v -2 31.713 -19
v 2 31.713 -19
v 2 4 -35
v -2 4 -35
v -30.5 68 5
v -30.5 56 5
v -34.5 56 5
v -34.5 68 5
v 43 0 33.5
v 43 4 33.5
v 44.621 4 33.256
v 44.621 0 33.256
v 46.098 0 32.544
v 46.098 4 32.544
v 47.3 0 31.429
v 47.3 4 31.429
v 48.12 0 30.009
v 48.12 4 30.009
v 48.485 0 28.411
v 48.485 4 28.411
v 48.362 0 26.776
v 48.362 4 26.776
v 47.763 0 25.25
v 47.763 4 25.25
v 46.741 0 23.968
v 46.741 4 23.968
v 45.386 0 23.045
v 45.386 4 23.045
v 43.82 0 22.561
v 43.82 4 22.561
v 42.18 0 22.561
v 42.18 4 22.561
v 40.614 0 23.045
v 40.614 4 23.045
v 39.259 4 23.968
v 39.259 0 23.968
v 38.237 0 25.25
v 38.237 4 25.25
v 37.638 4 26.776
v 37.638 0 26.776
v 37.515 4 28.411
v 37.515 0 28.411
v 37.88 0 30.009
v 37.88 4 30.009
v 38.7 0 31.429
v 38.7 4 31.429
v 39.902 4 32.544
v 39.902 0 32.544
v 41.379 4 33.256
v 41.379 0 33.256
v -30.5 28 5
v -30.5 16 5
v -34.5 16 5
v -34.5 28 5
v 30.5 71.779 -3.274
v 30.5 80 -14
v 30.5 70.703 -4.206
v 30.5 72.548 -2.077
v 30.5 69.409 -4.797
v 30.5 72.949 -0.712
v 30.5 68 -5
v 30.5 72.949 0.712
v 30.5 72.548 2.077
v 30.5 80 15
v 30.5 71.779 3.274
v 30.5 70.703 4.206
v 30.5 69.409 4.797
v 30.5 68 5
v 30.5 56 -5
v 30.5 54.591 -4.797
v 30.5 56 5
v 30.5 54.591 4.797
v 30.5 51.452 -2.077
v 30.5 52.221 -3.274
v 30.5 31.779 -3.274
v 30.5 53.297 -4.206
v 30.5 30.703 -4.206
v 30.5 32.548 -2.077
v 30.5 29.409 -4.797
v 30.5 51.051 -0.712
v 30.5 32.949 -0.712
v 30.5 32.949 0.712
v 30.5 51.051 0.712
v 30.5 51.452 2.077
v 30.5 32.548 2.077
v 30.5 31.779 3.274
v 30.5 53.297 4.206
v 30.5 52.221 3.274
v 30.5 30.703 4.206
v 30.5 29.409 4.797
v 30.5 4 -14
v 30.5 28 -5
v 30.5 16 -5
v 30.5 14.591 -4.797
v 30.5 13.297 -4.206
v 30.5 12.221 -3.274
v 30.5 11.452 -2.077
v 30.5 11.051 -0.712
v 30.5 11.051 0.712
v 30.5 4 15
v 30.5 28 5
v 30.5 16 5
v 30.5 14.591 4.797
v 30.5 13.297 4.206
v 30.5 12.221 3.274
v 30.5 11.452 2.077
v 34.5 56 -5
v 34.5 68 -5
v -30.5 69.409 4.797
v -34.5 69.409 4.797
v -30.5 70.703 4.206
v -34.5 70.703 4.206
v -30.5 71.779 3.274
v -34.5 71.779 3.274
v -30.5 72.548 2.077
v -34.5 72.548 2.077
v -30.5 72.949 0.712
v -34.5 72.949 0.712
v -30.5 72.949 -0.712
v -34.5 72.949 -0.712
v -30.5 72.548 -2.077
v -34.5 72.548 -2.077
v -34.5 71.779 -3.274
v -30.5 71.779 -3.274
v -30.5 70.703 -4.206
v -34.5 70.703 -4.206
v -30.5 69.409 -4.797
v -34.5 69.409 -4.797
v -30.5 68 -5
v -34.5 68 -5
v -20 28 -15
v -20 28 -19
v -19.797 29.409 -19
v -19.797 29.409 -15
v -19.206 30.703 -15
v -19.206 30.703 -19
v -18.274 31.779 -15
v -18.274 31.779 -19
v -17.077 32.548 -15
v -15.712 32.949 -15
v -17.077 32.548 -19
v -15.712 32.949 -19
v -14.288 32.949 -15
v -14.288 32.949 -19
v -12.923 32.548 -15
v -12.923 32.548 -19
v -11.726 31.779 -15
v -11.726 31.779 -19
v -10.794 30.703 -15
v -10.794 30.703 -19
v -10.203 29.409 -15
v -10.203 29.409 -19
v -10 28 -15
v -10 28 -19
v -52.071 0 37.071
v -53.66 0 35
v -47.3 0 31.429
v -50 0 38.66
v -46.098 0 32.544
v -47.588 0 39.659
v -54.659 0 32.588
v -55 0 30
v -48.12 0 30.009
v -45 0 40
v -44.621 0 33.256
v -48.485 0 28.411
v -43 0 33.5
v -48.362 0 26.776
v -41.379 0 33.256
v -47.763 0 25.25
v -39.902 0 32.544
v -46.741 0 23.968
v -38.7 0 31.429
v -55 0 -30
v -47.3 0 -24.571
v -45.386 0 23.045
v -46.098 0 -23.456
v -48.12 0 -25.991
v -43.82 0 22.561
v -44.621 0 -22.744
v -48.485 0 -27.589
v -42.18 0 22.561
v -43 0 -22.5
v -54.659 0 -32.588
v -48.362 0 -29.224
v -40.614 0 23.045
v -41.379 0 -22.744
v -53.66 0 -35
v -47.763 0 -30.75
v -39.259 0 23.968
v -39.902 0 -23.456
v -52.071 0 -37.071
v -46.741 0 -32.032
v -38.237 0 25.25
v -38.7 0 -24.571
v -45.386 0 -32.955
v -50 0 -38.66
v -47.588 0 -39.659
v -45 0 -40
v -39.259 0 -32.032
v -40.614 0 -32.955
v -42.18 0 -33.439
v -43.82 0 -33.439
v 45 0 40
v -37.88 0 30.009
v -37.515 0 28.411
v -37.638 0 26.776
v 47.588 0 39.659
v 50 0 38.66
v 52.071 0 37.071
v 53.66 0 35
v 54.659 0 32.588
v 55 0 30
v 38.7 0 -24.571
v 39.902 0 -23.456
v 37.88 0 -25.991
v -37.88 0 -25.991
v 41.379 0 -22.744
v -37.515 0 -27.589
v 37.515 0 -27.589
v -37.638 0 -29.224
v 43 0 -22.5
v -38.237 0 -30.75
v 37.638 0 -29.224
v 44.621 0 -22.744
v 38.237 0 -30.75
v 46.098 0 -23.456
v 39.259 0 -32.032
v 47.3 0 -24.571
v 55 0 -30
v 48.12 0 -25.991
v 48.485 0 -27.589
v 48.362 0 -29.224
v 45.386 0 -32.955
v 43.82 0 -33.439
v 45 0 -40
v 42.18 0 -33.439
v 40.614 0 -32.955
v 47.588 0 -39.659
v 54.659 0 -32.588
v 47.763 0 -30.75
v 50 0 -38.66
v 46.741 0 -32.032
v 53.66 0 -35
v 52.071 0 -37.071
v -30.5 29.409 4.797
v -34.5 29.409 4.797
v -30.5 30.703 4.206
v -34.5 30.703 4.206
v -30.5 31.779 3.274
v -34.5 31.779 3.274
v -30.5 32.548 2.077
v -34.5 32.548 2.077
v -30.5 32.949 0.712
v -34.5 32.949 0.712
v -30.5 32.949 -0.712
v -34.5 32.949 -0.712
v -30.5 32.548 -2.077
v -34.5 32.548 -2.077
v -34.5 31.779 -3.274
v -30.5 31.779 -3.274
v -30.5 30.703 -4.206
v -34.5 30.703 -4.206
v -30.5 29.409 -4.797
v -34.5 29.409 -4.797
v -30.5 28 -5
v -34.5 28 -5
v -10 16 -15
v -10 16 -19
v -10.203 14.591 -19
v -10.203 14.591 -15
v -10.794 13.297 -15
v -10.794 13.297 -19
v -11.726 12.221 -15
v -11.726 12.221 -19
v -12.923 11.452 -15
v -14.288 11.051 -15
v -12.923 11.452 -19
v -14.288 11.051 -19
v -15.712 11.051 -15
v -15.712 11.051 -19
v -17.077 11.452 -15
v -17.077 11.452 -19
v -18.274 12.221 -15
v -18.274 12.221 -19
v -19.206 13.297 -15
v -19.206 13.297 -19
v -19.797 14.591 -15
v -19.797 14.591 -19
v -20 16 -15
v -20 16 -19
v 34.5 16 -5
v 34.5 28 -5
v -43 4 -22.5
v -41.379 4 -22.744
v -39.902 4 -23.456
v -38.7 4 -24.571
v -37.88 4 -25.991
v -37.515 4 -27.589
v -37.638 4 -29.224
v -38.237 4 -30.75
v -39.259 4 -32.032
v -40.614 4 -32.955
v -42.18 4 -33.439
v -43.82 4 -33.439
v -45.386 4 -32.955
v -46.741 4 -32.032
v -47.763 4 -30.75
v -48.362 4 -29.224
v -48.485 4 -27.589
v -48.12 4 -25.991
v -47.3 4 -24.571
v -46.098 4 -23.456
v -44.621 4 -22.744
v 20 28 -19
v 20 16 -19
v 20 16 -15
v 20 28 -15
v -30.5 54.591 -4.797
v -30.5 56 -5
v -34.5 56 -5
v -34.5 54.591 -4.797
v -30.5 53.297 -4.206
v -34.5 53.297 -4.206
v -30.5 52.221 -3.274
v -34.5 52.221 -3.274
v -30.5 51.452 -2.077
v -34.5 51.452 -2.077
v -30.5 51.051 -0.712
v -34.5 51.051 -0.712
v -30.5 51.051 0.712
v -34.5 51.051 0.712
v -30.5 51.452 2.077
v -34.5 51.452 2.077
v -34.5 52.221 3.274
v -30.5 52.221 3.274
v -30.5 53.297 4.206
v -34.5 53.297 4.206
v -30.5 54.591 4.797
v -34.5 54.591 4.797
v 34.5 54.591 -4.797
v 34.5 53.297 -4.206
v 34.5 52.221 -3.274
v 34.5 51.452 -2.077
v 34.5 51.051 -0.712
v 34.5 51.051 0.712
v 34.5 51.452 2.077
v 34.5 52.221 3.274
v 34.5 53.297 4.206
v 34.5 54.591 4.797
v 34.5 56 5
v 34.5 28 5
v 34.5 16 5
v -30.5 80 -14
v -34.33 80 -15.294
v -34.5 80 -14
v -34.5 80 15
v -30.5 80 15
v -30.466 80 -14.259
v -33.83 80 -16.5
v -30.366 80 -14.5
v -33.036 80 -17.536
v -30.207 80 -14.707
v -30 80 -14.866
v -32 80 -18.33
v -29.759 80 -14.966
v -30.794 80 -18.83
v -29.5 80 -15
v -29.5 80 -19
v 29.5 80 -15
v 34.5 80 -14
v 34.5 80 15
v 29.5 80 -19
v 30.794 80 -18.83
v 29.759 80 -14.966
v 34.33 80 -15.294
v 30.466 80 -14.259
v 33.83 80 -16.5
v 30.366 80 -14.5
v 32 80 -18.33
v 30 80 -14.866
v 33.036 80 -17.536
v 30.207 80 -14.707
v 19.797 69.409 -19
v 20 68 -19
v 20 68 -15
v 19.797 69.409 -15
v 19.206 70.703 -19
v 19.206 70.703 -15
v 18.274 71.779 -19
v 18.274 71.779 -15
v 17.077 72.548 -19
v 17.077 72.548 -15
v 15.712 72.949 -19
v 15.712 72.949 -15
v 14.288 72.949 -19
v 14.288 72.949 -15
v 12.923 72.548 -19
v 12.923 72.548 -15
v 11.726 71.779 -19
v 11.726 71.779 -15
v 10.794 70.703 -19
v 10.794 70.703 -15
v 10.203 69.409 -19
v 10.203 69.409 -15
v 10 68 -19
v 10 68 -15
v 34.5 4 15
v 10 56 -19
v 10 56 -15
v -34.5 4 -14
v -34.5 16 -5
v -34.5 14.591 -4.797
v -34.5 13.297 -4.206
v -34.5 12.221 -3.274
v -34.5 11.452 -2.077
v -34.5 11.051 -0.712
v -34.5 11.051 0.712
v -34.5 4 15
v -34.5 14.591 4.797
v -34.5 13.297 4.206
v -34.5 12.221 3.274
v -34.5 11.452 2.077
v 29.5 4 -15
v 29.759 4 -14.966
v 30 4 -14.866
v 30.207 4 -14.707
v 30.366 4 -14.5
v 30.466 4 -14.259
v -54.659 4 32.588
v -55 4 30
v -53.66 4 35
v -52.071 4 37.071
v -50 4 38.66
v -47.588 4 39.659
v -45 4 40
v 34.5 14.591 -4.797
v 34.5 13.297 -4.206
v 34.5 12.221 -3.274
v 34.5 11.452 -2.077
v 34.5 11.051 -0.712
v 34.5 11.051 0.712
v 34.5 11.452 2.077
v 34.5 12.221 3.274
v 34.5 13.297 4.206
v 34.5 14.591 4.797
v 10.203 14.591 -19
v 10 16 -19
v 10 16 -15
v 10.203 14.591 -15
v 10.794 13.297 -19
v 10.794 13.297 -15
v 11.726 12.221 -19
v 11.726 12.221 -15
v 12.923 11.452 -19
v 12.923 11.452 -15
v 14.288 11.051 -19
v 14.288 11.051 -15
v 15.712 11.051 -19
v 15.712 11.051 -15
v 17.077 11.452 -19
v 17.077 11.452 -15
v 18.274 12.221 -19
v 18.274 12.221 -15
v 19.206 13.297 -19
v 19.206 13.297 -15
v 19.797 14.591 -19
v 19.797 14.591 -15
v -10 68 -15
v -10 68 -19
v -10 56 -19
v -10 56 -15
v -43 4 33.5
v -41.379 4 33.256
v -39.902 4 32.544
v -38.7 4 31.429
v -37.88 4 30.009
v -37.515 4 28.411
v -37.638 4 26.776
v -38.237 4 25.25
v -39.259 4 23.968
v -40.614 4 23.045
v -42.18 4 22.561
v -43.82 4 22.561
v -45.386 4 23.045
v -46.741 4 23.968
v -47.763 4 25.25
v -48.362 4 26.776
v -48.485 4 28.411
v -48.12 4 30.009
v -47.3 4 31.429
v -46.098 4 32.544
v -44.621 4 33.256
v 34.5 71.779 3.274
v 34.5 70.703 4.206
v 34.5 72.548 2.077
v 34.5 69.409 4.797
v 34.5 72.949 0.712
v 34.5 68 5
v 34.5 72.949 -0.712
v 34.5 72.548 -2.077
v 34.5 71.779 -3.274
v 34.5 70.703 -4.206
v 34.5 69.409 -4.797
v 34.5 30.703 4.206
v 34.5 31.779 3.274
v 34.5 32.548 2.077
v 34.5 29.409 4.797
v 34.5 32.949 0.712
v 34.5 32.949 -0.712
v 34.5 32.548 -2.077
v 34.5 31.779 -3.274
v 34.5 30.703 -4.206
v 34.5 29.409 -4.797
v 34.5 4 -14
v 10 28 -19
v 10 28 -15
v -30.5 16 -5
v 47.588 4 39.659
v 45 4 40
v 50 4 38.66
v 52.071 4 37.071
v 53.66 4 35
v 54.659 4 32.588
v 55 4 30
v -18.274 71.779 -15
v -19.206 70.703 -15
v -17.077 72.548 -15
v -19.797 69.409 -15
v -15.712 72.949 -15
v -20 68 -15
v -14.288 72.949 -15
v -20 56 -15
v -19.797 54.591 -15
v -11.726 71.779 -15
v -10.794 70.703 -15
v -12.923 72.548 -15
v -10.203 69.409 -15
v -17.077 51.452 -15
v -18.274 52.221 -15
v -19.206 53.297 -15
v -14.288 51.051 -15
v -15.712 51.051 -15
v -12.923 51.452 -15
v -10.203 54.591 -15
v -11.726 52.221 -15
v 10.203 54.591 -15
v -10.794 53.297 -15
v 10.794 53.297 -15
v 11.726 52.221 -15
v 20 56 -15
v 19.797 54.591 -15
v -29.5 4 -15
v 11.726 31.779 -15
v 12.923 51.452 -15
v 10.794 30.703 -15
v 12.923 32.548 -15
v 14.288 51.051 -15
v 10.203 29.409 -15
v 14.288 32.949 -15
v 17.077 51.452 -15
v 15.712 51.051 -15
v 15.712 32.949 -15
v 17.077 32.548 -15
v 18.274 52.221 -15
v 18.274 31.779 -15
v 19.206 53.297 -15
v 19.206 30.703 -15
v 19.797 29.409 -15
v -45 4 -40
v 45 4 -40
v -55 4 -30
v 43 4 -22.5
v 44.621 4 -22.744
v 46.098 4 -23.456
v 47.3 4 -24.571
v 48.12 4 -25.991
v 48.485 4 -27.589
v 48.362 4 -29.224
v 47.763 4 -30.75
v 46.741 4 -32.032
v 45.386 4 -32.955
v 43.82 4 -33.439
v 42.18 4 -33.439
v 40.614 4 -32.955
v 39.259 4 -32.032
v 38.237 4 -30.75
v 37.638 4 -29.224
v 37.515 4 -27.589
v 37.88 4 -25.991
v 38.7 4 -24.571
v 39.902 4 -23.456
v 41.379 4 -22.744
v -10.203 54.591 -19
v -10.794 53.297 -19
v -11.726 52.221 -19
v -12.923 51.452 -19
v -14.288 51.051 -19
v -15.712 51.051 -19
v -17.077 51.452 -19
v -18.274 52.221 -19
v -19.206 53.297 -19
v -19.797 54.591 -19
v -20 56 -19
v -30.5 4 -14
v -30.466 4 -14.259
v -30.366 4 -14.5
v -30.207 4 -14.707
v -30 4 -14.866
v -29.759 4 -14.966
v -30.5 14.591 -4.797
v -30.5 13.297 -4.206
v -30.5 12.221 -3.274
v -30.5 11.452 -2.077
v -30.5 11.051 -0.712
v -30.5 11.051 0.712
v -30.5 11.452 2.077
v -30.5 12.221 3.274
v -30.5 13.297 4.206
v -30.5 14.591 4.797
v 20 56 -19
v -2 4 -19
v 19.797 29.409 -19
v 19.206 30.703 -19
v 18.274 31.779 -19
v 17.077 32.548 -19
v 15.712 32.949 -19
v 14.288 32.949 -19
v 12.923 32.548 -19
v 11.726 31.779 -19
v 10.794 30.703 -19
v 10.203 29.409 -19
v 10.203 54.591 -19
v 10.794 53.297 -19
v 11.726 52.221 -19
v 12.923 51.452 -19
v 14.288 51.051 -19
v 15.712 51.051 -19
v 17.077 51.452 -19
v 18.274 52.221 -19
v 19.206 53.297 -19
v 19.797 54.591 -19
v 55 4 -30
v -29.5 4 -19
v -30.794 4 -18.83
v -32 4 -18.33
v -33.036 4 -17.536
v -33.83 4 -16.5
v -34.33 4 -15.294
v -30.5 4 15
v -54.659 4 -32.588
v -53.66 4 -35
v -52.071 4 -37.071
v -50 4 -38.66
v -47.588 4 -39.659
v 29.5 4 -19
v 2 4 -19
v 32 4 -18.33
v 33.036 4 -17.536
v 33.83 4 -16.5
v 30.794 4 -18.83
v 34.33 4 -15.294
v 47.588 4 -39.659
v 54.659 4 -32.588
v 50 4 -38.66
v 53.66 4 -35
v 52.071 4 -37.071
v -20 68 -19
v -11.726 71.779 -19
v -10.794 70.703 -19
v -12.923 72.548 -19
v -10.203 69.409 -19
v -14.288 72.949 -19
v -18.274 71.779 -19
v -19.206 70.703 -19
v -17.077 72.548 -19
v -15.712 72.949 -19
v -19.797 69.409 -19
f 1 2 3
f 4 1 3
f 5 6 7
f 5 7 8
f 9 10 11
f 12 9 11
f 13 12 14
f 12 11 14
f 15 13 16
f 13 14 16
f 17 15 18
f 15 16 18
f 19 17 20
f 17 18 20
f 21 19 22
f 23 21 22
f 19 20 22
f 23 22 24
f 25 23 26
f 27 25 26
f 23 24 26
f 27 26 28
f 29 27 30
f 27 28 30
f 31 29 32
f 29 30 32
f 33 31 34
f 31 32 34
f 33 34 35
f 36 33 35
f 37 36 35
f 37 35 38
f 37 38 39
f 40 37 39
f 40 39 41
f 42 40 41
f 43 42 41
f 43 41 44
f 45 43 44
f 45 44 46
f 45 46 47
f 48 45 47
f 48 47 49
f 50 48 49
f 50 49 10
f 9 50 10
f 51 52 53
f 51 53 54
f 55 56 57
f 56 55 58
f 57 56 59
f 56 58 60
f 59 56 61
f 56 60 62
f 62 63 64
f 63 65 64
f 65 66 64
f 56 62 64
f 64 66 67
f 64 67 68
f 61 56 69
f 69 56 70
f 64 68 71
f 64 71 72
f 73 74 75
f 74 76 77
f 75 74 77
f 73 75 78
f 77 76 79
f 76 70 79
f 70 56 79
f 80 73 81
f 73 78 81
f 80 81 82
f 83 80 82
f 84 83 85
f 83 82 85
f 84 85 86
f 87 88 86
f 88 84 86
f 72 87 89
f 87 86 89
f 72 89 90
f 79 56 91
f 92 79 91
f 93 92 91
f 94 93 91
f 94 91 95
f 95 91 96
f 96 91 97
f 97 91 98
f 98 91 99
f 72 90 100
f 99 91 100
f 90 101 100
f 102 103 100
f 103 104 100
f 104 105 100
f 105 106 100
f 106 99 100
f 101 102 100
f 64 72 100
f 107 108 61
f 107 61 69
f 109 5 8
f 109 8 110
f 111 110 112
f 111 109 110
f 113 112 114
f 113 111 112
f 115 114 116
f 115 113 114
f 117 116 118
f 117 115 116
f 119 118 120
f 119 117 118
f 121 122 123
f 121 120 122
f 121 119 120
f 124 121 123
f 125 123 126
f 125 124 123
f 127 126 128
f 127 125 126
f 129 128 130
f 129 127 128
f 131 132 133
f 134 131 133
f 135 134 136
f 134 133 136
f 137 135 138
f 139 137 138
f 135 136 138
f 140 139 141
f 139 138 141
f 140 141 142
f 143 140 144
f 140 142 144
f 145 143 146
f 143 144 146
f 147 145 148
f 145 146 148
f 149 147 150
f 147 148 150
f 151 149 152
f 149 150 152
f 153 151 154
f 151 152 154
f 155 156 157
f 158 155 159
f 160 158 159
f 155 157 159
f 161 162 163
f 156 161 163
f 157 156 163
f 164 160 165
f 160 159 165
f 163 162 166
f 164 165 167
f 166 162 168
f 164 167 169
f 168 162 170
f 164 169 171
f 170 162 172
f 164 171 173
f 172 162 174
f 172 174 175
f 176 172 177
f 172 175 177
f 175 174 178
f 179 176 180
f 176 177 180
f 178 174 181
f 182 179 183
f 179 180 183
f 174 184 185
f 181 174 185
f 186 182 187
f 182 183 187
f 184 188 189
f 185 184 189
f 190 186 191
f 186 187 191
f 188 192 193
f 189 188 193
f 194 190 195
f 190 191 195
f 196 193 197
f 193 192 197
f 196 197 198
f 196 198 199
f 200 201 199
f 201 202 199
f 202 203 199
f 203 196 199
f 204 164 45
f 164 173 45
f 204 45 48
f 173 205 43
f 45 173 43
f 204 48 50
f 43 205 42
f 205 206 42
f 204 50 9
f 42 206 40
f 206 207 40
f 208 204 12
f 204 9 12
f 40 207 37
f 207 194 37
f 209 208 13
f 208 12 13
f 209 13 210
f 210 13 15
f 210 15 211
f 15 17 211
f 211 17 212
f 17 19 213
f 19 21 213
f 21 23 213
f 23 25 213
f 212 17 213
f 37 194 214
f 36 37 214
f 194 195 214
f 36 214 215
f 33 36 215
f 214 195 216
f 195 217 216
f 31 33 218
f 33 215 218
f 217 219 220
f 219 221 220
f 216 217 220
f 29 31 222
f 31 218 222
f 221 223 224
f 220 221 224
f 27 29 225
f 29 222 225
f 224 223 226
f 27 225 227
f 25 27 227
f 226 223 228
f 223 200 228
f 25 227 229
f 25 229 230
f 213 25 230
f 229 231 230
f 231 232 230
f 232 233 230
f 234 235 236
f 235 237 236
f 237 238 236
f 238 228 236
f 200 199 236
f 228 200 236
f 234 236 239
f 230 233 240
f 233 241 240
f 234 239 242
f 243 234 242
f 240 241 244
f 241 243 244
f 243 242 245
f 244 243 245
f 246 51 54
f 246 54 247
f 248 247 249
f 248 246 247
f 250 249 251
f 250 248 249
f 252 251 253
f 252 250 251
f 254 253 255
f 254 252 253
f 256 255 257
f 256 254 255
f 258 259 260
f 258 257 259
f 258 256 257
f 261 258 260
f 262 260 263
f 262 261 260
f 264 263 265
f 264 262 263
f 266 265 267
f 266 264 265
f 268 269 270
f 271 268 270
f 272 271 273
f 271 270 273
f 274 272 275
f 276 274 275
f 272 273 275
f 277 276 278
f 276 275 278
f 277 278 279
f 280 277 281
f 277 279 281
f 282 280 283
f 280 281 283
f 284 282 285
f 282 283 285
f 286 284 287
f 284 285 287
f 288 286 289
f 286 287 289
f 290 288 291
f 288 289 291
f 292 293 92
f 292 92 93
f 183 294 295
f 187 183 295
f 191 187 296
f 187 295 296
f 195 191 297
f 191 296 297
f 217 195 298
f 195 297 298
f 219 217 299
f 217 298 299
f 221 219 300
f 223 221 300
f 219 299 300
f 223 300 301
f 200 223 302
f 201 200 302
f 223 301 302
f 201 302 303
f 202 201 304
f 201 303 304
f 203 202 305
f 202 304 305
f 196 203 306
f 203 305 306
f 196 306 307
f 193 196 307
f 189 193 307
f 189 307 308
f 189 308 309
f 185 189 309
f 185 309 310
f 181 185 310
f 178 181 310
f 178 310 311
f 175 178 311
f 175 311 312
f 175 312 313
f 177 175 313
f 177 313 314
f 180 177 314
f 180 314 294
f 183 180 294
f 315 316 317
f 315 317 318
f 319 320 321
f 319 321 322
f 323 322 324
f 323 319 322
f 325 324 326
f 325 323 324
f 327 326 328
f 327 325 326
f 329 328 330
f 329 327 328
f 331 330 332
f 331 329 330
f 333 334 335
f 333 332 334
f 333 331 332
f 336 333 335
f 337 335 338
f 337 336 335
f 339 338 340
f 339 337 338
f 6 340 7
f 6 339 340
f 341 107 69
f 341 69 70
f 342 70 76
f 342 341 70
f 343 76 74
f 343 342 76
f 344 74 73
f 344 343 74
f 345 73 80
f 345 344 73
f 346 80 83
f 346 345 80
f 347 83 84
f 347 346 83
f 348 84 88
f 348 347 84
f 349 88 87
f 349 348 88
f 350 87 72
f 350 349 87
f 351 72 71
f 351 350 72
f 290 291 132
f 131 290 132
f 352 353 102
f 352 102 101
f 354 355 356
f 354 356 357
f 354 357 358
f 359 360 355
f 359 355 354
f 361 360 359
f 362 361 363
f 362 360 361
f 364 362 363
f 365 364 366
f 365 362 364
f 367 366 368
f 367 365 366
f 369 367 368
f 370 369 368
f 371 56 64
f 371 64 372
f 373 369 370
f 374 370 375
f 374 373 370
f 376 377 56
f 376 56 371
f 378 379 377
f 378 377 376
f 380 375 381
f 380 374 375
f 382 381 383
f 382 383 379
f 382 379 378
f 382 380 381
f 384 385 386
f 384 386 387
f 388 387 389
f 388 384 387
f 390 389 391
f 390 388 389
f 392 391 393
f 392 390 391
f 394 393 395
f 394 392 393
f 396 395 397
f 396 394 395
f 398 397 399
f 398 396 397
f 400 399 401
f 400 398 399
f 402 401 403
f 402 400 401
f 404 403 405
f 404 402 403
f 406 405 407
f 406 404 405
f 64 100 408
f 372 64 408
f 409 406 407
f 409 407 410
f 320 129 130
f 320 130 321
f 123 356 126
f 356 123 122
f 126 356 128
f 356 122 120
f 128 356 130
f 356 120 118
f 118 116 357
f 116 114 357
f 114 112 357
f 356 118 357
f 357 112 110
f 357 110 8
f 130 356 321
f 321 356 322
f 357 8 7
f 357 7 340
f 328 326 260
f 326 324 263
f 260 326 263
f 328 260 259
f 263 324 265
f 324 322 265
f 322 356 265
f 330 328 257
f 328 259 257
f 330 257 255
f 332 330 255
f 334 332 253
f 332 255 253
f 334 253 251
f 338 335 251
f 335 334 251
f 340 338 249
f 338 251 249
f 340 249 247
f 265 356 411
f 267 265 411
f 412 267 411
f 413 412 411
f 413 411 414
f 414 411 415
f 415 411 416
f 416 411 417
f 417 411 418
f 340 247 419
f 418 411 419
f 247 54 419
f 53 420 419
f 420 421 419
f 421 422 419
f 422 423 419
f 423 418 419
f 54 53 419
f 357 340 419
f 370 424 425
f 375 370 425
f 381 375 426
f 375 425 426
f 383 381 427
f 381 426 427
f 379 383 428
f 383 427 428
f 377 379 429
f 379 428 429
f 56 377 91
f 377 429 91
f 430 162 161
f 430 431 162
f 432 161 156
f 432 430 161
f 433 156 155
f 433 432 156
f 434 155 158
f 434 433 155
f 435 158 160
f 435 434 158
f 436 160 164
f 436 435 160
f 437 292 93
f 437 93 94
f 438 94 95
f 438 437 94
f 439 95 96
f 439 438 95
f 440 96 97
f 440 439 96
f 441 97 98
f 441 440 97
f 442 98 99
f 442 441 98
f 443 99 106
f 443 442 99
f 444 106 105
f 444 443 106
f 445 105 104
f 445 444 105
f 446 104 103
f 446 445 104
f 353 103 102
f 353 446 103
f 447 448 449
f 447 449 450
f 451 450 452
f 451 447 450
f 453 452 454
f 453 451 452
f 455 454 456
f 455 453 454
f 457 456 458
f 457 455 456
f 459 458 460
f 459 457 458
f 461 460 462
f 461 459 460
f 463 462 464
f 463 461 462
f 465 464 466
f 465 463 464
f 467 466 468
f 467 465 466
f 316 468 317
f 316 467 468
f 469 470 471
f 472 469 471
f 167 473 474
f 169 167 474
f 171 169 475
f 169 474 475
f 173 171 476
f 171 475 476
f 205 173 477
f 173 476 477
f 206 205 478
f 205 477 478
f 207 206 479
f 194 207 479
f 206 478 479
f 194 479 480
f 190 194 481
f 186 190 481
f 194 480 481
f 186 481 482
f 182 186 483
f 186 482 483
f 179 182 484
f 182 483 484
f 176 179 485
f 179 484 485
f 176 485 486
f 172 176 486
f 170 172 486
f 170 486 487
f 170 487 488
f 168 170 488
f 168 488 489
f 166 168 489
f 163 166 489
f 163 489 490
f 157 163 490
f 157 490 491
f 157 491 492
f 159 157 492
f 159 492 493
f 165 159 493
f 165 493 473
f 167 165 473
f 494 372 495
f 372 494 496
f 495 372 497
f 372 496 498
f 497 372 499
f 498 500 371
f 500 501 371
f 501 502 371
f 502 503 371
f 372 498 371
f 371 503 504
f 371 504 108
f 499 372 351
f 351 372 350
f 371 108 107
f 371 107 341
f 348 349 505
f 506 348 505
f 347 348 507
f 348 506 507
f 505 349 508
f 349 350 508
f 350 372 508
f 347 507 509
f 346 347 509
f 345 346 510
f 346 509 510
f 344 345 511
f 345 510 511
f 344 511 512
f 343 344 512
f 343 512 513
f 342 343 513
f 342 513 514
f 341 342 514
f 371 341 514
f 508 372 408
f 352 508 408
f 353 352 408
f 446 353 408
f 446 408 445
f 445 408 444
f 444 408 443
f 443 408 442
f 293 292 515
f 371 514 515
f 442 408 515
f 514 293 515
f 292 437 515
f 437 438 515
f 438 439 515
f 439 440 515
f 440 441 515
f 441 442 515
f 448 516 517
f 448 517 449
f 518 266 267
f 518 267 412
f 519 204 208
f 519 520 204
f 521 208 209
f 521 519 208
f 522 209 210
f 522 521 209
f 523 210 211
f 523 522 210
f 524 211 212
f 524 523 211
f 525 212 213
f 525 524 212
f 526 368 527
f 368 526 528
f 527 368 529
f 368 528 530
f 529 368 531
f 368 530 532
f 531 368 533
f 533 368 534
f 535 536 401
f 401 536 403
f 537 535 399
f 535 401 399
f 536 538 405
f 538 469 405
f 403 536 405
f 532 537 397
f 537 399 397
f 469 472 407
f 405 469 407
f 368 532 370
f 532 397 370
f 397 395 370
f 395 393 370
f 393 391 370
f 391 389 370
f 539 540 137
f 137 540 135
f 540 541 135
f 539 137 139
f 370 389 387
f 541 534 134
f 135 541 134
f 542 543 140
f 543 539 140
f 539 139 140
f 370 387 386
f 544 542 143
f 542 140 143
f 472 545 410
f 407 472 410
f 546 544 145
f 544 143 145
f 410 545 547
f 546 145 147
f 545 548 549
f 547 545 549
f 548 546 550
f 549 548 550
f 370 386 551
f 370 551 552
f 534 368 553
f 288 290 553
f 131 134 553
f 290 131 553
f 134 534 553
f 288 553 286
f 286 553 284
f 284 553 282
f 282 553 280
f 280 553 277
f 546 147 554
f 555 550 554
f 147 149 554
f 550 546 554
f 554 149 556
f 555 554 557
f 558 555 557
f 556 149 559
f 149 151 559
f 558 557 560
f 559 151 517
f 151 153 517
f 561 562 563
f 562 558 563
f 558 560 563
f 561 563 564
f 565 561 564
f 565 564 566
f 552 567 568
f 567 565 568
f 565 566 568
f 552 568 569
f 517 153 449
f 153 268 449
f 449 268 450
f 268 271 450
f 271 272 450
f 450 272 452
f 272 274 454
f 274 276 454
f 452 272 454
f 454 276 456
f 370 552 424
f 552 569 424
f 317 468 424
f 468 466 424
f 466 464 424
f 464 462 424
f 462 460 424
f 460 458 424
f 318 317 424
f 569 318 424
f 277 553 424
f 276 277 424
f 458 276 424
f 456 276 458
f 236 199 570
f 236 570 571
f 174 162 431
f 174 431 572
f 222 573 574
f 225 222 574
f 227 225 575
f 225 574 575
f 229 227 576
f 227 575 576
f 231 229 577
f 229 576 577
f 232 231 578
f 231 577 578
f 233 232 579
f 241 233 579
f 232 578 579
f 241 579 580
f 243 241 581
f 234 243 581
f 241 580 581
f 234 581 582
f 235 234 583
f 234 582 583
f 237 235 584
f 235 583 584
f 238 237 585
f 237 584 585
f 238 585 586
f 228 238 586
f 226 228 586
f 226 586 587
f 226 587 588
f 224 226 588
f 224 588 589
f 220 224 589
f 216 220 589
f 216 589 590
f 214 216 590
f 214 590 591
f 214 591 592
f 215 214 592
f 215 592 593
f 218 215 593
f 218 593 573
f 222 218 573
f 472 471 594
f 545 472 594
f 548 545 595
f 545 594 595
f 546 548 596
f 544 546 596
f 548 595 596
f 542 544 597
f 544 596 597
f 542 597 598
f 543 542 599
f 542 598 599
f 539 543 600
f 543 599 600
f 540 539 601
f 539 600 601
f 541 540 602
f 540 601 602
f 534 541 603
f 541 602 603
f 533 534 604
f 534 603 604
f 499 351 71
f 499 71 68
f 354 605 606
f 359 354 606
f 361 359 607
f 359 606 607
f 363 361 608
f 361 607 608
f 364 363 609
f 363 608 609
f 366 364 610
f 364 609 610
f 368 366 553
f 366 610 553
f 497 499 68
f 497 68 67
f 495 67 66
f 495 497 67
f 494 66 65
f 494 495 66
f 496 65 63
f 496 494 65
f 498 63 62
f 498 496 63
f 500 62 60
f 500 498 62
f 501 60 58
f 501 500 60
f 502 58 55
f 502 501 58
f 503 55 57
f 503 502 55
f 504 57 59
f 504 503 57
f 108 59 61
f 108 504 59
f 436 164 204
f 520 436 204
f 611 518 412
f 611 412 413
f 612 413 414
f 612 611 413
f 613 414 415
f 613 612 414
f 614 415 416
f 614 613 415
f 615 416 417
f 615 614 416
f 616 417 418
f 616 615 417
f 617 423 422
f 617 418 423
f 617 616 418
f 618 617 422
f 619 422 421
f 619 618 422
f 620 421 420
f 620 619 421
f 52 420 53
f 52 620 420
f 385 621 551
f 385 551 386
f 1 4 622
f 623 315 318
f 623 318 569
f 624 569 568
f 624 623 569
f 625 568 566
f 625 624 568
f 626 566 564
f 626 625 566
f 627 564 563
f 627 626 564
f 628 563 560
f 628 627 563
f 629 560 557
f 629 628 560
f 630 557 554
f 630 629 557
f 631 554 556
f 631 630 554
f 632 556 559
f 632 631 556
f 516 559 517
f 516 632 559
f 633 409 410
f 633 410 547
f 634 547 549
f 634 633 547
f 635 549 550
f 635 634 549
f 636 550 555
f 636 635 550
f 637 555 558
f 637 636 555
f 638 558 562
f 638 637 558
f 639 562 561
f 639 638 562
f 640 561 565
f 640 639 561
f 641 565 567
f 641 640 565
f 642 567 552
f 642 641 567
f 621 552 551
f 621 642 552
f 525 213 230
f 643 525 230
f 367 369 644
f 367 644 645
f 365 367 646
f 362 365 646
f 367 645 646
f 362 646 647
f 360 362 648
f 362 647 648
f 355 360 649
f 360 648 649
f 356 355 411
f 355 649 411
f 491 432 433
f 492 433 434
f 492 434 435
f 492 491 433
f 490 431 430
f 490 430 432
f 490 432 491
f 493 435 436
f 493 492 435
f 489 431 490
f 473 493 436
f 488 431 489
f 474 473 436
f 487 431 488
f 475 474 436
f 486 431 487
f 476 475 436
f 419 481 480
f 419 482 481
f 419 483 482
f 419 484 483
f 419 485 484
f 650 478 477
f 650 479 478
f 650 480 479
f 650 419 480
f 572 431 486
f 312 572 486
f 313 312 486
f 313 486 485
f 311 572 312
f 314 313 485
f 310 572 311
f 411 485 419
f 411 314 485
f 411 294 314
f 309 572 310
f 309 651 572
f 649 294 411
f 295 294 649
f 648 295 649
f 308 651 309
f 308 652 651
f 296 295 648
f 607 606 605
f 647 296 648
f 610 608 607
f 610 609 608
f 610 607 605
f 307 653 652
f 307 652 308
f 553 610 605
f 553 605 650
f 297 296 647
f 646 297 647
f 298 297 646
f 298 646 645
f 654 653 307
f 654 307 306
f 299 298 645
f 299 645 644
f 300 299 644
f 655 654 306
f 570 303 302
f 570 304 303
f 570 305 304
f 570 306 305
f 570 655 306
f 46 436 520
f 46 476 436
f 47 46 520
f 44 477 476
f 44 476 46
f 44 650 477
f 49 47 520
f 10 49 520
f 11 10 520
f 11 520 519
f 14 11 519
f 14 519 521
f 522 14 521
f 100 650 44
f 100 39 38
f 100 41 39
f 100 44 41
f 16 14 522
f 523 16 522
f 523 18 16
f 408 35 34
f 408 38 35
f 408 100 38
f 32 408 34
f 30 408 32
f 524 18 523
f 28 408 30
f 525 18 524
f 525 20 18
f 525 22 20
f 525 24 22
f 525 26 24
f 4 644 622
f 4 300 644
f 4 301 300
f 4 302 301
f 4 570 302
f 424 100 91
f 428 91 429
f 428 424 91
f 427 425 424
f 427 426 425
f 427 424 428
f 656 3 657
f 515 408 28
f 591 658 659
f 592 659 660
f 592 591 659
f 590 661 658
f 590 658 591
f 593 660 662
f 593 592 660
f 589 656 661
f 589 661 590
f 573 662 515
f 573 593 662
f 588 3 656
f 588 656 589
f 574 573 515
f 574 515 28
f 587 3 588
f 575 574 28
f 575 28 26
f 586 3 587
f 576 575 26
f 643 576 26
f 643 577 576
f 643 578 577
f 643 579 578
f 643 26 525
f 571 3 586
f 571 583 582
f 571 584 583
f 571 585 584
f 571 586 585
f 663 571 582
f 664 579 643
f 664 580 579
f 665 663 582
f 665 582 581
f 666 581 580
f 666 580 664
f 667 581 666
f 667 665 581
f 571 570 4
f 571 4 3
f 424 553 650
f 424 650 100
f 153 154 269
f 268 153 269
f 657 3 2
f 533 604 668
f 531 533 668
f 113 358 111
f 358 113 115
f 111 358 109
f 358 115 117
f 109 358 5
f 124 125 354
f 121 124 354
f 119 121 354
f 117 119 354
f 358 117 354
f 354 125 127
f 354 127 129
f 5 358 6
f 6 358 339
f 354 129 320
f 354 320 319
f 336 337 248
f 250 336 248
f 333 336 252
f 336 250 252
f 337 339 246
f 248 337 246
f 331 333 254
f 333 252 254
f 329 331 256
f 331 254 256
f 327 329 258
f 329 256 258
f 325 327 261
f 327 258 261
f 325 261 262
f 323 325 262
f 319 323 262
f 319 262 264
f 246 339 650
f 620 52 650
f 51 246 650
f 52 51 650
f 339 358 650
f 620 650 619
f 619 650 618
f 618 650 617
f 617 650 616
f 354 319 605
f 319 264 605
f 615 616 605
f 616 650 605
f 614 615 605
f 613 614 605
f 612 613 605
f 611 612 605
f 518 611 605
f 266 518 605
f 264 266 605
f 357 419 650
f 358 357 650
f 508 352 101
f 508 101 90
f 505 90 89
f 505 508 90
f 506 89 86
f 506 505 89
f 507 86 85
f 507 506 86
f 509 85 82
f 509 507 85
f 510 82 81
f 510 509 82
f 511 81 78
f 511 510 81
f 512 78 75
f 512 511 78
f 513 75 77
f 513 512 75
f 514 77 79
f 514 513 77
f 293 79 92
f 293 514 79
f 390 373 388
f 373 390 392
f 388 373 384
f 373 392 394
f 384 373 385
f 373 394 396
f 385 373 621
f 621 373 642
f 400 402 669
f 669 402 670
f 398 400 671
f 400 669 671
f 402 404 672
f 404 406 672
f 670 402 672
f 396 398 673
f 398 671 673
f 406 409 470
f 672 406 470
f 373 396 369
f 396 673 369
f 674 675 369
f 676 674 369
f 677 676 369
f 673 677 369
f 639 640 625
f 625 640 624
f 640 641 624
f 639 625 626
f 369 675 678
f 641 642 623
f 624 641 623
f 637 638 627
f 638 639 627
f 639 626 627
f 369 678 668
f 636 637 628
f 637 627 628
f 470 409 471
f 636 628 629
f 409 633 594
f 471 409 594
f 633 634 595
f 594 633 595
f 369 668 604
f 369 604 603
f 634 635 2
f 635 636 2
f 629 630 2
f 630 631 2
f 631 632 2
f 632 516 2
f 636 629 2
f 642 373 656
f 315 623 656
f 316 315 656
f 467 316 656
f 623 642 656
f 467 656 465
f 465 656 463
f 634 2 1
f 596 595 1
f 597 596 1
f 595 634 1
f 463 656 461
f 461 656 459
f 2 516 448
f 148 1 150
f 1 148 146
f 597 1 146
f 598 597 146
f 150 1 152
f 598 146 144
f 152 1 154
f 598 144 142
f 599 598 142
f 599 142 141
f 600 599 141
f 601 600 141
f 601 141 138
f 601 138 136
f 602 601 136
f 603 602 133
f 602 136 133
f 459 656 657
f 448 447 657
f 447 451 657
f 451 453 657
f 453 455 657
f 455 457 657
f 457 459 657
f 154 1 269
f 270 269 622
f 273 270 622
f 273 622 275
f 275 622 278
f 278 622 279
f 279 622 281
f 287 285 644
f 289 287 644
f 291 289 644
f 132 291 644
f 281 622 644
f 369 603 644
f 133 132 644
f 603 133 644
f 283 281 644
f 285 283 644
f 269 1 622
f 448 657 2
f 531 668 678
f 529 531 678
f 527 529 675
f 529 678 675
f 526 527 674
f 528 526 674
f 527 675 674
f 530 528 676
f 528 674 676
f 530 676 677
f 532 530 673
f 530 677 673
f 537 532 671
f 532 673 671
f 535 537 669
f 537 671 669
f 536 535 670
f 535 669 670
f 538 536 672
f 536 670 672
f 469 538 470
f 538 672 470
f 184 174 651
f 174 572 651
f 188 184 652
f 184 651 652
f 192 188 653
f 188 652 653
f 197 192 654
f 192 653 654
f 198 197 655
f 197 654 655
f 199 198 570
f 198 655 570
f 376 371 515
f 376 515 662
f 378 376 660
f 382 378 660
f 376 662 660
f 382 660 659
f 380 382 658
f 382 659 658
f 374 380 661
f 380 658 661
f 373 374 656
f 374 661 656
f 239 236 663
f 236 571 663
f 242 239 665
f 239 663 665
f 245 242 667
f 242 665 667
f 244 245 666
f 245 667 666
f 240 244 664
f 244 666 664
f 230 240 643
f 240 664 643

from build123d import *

# Parameters (mm, degrees)
SKETCH_2_W          = 110
SKETCH_2_H          = 80
EXTRUDE_1_DEPTH     = 4
EXTRUDE_1_2_DEPTH   = 76
EXTRUDE_2_DEPTH     = 2
CUT_EXTRUDE_1_DEPTH = 90.5
SKETCH_6_R          = 5.5
CUT_EXTRUDE_2_DEPTH = 5
FILLET_1_R          = 10
CUT_EXTRUDE_3_REACH = 61


with BuildPart() as part:
    # Эскиз2 → Extrude 1 (new body)
    with BuildSketch(Plane(origin=(0, 0, 0), x_dir=(1, 0, 0), z_dir=(0, 1, 0))):
        Rectangle(SKETCH_2_W, SKETCH_2_H)
    extrude(amount=EXTRUDE_1_DEPTH)

    # Эскиз3 → Extrude 1 2 (add)
    with BuildSketch(Plane(origin=(0, 4, 0), x_dir=(1, 0, 0), z_dir=(0, 1, 0))):
        with BuildLine():
            Line((-30.5, -15), (-30.5, 14))
            ThreePointArc((-30.5, 14), (-30.207106781, 14.707106781), (-29.5, 15))
            Line((-29.5, 15), (29.5, 15))
            ThreePointArc((29.5, 15), (30.207106781, 14.707106781), (30.5, 14))
            Line((30.5, 14), (30.5, -15))
            Line((30.5, -15), (34.5, -15))
            Line((34.5, -15), (34.5, 14))
            ThreePointArc((34.5, 14), (33.035533906, 17.535533906), (29.5, 19))
            Line((29.5, 19), (-29.5, 19))
            ThreePointArc((-29.5, 19), (-33.035533906, 17.535533906), (-34.5, 14))
            Line((-34.5, 14), (-34.5, -15))
            Line((-34.5, -15), (-30.5, -15))
        make_face()
    extrude(amount=EXTRUDE_1_2_DEPTH)

    # Эскиз4 → Бобышка-Вытянуть2 (add, symmetric)
    with BuildSketch(Plane(origin=(0, 0, 0), x_dir=(0, 0, -1), z_dir=(1, 0, 0))):
        Polygon((19, 31.712812921), (35, 4), (19, 4), align=None)
    extrude(amount=EXTRUDE_2_DEPTH, both=True)

    # Эскиз5 → Вырез-Вытянуть1 (cut, through all)
    with BuildSketch(Plane(origin=(34.5, 0, 0), x_dir=(0, 0, -1), z_dir=(1, 0, 0))):
        with BuildLine():
            Line((5, 68), (5, 56))
            ThreePointArc((5, 56), (0, 51), (-5, 56))
            Line((-5, 56), (-5, 68))
            ThreePointArc((-5, 68), (0, 73), (5, 68))
        make_face()
        with BuildLine():
            Line((5, 28), (5, 16))
            ThreePointArc((5, 16), (0, 11), (-5, 16))
            Line((-5, 16), (-5, 28))
            ThreePointArc((-5, 28), (0, 33), (5, 28))
        make_face()
    extrude(amount=-CUT_EXTRUDE_1_DEPTH, mode=Mode.SUBTRACT)

    # Эскиз6 → Вырез-Вытянуть2 (cut, through all)
    with BuildSketch(Plane(origin=(0, 4, 0), x_dir=(1, 0, 0), z_dir=(0, 1, 0))):
        with Locations(Location((-43, 28, 0), (0, 0, 270))):  # turned: the seam where the file's is
            Circle(SKETCH_6_R)
        with Locations(Location((-43, -28, 0), (0, 0, 270))):  # turned: the seam where the file's is
            Circle(SKETCH_6_R)
        with Locations(Location((43, 28, 0), (0, 0, 270))):  # turned: the seam where the file's is
            Circle(SKETCH_6_R)
        with Locations(Location((43, -28, 0), (0, 0, 270))):  # turned: the seam where the file's is
            Circle(SKETCH_6_R)
    extrude(amount=-CUT_EXTRUDE_2_DEPTH, mode=Mode.SUBTRACT)

    # Скругление1
    fillet_1_edges = [part.edges().sort_by_distance(p)[0] for p in [
        (55, 2, 40),
        (-55, 2, 40),
        (-55, 2, -40),
        (55, 2, -40),
    ]]
    fillet(fillet_1_edges, radius=FILLET_1_R)

    # Эскиз8 → Вырез-Вытянуть3 (cut, up to next)
    with BuildSketch(Plane(origin=(0, 0, -19), x_dir=(-1, 0, 0), z_dir=(0, 0, -1)), mode=Mode.PRIVATE) as cut_extrude_3_sk1:
        with BuildLine():
            Line((-10, 68), (-10, 56))
            ThreePointArc((-10, 56), (-15, 51), (-20, 56))
            Line((-20, 56), (-20, 68))
            ThreePointArc((-20, 68), (-15, 73), (-10, 68))
        make_face()
    cut_extrude_3_tool1 = extrude(cut_extrude_3_sk1.sketch, amount=-CUT_EXTRUDE_3_REACH, mode=Mode.PRIVATE) & part.part
    add(cut_extrude_3_tool1.solids().sort_by_distance((15, 62, -19))[0], mode=Mode.SUBTRACT)
    # Эскиз8 → Вырез-Вытянуть3 (cut, up to next)
    with BuildSketch(Plane(origin=(0, 0, -19), x_dir=(-1, 0, 0), z_dir=(0, 0, -1)), mode=Mode.PRIVATE) as cut_extrude_3_sk2:
        with BuildLine():
            Line((-10, 28), (-10, 16))
            ThreePointArc((-10, 16), (-15, 11), (-20, 16))
            Line((-20, 16), (-20, 28))
            ThreePointArc((-20, 28), (-15, 33), (-10, 28))
        make_face()
    cut_extrude_3_tool2 = extrude(cut_extrude_3_sk2.sketch, amount=-CUT_EXTRUDE_3_REACH, mode=Mode.PRIVATE) & part.part
    add(cut_extrude_3_tool2.solids().sort_by_distance((15, 22, -19))[0], mode=Mode.SUBTRACT)
    # Эскиз8 → Вырез-Вытянуть3 (cut, up to next)
    with BuildSketch(Plane(origin=(0, 0, -19), x_dir=(-1, 0, 0), z_dir=(0, 0, -1)), mode=Mode.PRIVATE) as cut_extrude_3_sk3:
        with BuildLine():
            Line((10, 68), (10, 56))
            ThreePointArc((10, 56), (15, 51), (20, 56))
            Line((20, 56), (20, 68))
            ThreePointArc((20, 68), (15, 73), (10, 68))
        make_face()
    cut_extrude_3_tool3 = extrude(cut_extrude_3_sk3.sketch, amount=-CUT_EXTRUDE_3_REACH, mode=Mode.PRIVATE) & part.part
    add(cut_extrude_3_tool3.solids().sort_by_distance((-15, 62, -19))[0], mode=Mode.SUBTRACT)
    # Эскиз8 → Вырез-Вытянуть3 (cut, up to next)
    with BuildSketch(Plane(origin=(0, 0, -19), x_dir=(-1, 0, 0), z_dir=(0, 0, -1)), mode=Mode.PRIVATE) as cut_extrude_3_sk4:
        with BuildLine():
            Line((10, 28), (10, 16))
            ThreePointArc((10, 16), (15, 11), (20, 16))
            Line((20, 16), (20, 28))
            ThreePointArc((20, 28), (15, 33), (10, 28))
        make_face()
    cut_extrude_3_tool4 = extrude(cut_extrude_3_sk4.sketch, amount=-CUT_EXTRUDE_3_REACH, mode=Mode.PRIVATE) & part.part
    add(cut_extrude_3_tool4.solids().sort_by_distance((-15, 22, -19))[0], mode=Mode.SUBTRACT)


solid = part.part
